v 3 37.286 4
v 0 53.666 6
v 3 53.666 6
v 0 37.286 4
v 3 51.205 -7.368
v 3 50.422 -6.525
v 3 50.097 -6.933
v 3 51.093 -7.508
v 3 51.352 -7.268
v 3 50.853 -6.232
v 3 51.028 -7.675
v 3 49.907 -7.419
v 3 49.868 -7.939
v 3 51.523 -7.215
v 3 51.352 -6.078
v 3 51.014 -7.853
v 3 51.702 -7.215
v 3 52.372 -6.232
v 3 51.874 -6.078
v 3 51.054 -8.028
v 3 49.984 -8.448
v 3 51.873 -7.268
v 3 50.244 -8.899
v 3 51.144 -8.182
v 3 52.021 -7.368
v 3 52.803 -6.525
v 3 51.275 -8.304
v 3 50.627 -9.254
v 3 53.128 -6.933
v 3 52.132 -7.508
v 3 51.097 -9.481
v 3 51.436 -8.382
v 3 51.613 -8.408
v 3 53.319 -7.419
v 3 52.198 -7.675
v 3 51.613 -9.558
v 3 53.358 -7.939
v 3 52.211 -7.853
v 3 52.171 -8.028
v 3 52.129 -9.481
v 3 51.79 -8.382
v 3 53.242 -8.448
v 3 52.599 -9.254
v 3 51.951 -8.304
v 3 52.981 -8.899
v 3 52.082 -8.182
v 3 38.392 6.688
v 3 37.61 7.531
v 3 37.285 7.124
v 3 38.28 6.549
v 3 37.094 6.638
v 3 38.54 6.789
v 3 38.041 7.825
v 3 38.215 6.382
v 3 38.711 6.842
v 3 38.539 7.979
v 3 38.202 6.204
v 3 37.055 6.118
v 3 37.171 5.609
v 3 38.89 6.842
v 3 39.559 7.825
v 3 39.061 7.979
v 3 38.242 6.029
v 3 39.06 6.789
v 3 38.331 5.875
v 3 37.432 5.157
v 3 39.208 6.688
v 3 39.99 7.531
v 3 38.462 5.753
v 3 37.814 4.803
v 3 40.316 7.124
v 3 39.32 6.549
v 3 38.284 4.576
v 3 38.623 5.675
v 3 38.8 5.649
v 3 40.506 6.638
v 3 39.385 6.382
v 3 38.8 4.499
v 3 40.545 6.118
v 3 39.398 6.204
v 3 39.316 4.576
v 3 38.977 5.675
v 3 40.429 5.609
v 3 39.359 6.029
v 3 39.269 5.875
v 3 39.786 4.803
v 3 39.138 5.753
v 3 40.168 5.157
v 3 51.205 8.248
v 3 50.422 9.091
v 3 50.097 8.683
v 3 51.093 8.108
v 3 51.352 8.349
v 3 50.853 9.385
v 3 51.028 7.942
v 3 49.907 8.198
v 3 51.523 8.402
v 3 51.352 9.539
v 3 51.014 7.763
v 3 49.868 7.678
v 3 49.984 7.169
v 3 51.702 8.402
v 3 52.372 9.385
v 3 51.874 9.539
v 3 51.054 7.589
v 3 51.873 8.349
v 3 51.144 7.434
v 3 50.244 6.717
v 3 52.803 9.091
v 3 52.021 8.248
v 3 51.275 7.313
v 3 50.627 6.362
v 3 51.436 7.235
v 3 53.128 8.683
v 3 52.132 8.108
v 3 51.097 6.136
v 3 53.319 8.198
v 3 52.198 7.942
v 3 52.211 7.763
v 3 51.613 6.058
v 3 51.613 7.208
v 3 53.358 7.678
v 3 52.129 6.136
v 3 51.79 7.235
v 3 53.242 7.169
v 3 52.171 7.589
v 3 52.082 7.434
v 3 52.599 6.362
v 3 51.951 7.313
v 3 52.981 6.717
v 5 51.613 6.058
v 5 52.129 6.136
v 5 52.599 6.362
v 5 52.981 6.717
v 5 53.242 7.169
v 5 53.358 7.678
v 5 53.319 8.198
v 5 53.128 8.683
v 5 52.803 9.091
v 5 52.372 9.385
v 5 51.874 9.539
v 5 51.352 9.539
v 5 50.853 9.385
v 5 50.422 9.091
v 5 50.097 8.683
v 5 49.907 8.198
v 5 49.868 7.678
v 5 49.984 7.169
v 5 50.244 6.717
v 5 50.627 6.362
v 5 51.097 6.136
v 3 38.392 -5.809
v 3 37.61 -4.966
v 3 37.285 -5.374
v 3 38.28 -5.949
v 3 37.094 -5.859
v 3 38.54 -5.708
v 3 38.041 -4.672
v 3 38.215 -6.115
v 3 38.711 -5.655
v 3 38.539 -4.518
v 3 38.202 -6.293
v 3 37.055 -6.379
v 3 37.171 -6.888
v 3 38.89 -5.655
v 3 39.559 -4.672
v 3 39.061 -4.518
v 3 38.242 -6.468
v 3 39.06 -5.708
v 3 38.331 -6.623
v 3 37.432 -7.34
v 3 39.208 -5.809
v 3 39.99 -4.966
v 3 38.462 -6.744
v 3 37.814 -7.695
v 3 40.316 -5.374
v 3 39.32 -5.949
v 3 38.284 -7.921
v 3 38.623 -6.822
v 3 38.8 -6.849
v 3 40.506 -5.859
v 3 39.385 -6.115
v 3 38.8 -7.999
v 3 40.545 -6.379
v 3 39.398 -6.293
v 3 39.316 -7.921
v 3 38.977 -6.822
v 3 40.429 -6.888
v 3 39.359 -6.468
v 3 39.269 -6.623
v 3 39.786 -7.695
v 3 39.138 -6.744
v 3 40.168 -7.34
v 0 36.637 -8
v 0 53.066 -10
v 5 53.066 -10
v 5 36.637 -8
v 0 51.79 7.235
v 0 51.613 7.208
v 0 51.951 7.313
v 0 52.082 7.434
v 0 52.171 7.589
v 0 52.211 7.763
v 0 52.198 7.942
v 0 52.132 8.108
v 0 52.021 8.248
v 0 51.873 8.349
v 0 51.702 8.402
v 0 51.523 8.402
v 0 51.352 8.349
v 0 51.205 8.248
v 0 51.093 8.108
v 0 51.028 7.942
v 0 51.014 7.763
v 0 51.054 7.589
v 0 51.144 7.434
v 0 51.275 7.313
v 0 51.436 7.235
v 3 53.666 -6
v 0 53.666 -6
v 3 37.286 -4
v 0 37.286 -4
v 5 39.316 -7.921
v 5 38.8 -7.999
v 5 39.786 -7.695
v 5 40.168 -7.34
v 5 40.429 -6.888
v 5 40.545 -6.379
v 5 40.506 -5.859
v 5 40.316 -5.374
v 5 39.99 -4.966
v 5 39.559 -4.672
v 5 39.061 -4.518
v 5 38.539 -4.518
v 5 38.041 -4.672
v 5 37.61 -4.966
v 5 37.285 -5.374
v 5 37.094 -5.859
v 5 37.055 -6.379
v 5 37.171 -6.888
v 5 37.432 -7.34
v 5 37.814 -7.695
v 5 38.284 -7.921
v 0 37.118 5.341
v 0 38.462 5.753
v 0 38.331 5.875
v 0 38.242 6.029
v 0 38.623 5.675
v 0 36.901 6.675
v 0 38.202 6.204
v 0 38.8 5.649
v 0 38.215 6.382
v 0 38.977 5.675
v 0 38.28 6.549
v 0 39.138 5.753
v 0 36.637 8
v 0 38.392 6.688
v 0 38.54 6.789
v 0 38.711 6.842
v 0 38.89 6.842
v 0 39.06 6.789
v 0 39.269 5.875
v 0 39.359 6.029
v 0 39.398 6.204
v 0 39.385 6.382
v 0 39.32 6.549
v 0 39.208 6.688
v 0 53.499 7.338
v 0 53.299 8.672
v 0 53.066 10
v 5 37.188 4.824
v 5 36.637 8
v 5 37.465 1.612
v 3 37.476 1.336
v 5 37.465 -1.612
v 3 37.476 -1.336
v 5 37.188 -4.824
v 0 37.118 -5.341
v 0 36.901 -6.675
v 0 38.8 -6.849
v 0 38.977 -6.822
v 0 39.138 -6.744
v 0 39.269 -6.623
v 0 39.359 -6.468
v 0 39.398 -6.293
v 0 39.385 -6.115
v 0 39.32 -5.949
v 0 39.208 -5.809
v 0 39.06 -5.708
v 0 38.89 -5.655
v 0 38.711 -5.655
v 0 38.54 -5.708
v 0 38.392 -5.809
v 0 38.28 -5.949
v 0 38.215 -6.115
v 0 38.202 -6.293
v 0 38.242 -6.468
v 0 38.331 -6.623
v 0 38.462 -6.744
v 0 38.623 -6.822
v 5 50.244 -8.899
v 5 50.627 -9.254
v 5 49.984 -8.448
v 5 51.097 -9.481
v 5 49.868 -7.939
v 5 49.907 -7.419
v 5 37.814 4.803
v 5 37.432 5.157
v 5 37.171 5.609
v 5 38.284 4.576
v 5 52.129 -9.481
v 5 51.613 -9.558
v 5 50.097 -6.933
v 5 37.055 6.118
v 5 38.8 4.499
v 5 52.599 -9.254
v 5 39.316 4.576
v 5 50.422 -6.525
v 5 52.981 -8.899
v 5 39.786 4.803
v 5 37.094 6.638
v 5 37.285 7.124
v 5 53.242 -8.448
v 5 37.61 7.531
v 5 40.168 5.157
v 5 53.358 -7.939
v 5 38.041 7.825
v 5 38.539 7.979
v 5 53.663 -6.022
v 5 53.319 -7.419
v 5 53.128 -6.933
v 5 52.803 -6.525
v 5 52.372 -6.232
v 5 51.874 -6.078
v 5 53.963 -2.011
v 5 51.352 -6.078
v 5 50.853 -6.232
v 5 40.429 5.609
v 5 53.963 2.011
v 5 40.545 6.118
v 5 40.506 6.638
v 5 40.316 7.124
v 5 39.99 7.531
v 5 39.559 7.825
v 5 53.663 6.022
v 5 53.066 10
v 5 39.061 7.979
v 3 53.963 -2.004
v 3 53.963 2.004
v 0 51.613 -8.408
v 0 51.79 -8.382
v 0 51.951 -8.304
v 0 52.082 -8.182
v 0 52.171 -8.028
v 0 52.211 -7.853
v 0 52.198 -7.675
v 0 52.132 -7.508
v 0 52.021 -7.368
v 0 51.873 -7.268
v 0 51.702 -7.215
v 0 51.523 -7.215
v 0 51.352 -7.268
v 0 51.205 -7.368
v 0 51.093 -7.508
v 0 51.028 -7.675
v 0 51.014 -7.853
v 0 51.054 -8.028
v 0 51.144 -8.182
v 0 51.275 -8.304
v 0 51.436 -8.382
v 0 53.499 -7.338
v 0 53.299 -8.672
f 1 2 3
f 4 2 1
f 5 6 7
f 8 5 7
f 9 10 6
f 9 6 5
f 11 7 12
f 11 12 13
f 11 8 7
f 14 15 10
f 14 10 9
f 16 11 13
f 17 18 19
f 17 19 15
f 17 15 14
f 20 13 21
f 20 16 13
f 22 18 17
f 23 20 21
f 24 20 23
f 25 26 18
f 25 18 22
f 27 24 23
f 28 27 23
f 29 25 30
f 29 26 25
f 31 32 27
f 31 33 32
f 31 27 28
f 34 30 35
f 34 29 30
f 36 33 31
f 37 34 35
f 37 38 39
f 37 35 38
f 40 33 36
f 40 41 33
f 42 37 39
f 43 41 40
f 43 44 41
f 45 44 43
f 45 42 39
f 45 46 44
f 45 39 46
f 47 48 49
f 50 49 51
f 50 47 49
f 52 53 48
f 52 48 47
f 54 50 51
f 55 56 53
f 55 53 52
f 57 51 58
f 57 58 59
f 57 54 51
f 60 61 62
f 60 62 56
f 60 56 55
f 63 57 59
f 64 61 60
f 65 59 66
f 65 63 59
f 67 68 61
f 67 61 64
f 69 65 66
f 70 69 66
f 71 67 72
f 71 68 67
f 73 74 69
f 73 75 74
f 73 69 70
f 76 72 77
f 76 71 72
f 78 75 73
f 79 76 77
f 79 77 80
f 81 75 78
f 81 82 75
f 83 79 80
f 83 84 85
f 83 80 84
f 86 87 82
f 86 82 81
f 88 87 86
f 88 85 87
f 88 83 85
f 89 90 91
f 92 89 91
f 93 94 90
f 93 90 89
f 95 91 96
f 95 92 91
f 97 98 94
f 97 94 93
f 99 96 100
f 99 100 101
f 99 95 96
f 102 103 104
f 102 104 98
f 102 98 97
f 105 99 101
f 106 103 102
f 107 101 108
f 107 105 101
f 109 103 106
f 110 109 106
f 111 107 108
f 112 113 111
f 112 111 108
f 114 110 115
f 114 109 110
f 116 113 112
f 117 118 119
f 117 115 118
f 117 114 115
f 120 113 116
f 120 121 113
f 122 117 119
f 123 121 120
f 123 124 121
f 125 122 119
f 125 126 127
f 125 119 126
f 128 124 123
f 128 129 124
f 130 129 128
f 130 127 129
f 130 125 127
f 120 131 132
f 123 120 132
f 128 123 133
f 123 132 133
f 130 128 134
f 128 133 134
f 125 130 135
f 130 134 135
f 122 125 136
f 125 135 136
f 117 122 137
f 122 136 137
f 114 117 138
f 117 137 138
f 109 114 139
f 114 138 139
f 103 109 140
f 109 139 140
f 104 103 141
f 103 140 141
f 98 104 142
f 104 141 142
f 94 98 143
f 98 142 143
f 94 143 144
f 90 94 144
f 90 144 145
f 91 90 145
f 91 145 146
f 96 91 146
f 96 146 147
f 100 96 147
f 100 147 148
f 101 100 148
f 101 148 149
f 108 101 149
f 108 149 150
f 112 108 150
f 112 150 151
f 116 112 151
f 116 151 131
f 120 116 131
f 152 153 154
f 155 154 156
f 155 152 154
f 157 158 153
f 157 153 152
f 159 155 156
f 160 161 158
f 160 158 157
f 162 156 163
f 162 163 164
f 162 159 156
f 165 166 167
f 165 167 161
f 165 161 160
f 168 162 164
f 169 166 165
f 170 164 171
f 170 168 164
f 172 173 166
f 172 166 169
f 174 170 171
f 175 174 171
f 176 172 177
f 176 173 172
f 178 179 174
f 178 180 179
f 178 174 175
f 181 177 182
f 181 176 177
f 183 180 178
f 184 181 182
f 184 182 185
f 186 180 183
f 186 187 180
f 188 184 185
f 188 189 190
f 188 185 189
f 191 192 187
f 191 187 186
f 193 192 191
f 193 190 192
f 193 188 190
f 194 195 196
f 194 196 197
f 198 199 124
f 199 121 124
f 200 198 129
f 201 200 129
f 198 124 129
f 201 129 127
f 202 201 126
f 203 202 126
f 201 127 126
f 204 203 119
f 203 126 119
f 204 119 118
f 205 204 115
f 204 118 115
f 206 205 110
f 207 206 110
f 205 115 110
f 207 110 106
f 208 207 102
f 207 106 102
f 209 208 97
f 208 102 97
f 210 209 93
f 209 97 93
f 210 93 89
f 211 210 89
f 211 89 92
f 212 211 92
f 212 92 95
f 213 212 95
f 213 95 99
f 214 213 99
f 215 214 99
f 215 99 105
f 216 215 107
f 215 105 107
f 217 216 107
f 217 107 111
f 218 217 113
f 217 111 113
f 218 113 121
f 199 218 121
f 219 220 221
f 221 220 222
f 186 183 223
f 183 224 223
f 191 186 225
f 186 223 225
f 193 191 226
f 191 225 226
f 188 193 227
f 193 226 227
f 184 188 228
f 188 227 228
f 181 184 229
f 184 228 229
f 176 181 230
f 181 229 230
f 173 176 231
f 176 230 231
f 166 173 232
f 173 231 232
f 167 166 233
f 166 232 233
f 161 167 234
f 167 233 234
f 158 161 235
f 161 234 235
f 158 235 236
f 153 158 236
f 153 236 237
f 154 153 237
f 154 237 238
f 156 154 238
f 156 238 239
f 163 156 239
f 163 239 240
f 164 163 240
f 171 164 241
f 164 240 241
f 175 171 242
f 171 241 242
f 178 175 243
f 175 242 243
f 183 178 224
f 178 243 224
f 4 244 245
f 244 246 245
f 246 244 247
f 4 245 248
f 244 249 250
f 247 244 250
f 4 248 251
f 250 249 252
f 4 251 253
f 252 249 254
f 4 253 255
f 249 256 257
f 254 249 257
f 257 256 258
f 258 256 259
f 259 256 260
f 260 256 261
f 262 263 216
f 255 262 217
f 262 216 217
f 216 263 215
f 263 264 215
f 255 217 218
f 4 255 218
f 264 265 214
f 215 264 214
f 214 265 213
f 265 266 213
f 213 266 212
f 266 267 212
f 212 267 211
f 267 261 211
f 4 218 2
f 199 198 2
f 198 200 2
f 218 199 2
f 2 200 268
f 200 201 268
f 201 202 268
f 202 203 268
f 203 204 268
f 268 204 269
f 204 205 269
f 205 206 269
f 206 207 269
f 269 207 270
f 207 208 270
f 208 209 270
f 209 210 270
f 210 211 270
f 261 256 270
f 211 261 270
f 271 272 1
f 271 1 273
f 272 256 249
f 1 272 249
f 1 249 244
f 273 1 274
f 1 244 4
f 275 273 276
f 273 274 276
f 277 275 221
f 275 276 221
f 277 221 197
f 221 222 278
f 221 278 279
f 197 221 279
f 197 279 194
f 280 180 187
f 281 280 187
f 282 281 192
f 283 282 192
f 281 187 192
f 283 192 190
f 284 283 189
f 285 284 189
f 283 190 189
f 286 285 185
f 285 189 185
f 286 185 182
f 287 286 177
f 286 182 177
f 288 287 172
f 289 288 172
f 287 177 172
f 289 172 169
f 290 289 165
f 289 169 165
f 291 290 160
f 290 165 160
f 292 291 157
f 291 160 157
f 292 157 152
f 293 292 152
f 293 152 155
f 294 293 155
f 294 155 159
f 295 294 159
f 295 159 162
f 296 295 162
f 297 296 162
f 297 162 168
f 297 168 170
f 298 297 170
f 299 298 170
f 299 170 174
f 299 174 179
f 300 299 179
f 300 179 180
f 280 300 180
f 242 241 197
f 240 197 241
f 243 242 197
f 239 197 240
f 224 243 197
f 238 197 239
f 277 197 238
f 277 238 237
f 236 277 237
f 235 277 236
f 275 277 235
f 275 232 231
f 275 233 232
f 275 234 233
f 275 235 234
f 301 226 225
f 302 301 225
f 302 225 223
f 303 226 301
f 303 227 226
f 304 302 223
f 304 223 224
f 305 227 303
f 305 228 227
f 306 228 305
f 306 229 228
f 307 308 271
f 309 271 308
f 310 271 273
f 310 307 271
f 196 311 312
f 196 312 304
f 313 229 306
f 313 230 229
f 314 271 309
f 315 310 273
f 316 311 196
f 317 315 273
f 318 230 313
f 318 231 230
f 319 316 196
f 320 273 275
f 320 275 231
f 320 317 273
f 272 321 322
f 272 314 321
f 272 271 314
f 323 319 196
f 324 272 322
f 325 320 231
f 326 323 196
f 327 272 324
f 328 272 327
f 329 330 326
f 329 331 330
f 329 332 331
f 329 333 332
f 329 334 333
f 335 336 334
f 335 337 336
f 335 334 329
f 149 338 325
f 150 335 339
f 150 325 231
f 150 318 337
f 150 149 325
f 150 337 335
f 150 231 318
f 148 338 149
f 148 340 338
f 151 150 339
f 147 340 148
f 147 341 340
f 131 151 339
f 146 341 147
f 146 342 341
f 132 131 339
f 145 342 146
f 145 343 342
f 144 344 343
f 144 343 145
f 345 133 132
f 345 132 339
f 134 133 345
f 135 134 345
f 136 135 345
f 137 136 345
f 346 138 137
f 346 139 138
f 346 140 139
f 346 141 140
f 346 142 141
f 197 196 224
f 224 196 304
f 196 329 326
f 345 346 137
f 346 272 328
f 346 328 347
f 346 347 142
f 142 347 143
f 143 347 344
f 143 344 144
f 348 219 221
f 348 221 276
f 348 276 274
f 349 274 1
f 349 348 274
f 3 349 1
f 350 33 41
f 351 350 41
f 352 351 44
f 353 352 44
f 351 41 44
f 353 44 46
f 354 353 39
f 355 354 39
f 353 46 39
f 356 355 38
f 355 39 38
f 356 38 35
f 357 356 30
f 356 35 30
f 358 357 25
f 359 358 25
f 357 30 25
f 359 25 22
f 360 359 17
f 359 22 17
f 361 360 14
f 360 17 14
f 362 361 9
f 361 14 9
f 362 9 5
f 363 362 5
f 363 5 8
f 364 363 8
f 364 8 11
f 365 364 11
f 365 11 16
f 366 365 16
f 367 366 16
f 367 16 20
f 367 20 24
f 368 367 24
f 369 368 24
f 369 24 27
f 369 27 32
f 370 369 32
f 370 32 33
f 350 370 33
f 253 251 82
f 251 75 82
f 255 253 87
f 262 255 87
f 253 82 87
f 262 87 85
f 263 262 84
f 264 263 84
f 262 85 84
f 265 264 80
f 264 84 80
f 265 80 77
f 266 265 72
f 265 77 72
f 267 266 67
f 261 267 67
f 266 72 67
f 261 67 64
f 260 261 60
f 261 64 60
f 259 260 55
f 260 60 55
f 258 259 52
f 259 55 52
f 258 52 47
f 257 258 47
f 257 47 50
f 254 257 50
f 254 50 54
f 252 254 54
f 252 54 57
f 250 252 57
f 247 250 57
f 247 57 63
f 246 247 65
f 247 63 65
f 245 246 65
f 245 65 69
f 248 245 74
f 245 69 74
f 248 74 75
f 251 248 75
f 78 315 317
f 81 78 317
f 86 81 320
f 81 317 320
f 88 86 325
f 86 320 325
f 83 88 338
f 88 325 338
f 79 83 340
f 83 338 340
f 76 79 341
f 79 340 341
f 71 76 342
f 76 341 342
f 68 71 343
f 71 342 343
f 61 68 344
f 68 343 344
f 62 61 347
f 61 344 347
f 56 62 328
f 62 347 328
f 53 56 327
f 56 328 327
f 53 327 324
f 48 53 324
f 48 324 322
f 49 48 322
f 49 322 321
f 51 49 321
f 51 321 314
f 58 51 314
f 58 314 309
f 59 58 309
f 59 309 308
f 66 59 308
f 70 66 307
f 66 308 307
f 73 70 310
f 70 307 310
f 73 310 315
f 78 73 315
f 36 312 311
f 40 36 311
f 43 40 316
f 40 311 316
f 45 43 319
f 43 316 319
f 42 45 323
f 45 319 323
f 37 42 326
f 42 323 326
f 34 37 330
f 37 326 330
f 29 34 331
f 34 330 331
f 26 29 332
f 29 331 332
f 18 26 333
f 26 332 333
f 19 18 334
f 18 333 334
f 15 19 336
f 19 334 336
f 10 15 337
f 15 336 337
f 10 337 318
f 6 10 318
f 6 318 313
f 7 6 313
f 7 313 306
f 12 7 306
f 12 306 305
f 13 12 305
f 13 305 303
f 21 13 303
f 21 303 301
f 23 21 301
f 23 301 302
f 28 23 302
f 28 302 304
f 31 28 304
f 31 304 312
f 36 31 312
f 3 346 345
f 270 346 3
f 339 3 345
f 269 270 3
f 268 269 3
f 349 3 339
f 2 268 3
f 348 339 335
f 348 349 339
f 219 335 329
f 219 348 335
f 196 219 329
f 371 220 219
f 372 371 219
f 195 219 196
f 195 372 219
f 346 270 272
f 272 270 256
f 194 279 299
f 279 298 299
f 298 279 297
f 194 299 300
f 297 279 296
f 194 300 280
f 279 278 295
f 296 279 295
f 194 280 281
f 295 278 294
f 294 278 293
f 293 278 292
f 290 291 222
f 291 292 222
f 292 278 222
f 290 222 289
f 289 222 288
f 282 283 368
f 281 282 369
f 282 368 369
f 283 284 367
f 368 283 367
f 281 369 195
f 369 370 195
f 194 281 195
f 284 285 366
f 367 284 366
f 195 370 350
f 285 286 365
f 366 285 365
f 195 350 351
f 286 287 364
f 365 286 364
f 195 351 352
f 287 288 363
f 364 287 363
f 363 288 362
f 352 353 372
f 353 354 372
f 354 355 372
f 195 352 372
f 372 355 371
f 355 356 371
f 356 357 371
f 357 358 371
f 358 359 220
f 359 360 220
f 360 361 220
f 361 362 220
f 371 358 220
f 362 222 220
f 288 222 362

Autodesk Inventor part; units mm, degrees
ref_plane "YZ Plane" through (0, 0, 0) normal (1, 0, 0) x (0, 1, 0)
ref_plane "XZ Plane" through (0, 0, 0) normal (0, 1, 0) x (-1, 0, 0)
ref_plane "XY Plane" through (0, 0, 0) normal (0, 0, 1) x (1, 0, 0)
sketch "Sketch1" plane through (0, 0, 0) normal (1, 0, 0) x (0, 1, 0)
  circle A0 centre (0, 0) radius 54
  circle A1 centre (0, 0) radius 37.5
  line L0 (37.5, 0) -> (54, 0)
  line L1 (53.066, -10) -> (36.6367, -8)
  line L2 (53.066, 10) -> (36.6367, 8)
  arc A2 (53.066, -10) -> (53.066, 10) centre (0, 0) ccw
  arc A3 (36.6367, -8) -> (36.6367, 8) centre (0, 0) ccw
  dimension "d0" = 108
  dimension "d1" = 75
  dimension "d2" = 10
  dimension "d3" = 0
  dimension "d4" = 8
extrude "Extrusion1" add sketch "Sketch1" along normal blind 5 contours L0 A1 L2 A0 | A0 L1 A1 L0
sketch "Sketch2" plane through (0, 0, 0) normal (-1, 0, 0) x (0, 0, 1)
  arc A0 (10, 53.066) -> (-10, 53.066) centre (0, 0) ccw projected
  line L0 (-6, 53.6656) -> (-4, 37.2861)
  arc A1 (8, 36.6367) -> (-8, 36.6367) centre (0, 0) ccw projected
  line L1 (0, 54) -> (0, 37.5)
  line L2 (6, 53.6656) -> (4, 37.2861)
  arc A2 (6, 53.6656) -> (-6, 53.6656) centre (0, 0) ccw
  arc A3 (4, 37.2861) -> (-4, 37.2861) centre (0, 0) ccw
  point P0 (0, 0)
  dimension "d7" = 4
  dimension "d8" = 4
extrude "Extrusion2" cut sketch "Sketch2" against normal blind 3
sketch "Sketch3" plane through (5, 0, 0) normal (1, 0, 0) x (0, 0, -1)
  line L0 (-10, 53.066) -> (-8, 36.6367) projected
  circle A0 centre (0, 0) radius 52.2
  circle A1 centre (0, 0) radius 39.3
  circle A2 centre (-7.8083, 51.6127) radius 0.6
  circle A3 centre (-6.2486, 38.8001) radius 0.6
  line L1 (0, 54) -> (0, 37.3718)
  circle A4 centre (7.8083, 51.6127) radius 0.6
  circle A5 centre (6.2486, 38.8001) radius 0.6
  dimension "d15" = 104.4
  dimension "d16" = 78.6
  dimension "d17" = 1.2
  dimension "d18" = 1.2
  dimension "d19" = 2
  dimension "d20" = 2
extrude "Extrusion3" cut sketch "Sketch3" against normal through all contours A2 A0 | A0 A2 | A3 A1 | A1 A3 | A4 A0 | A0 A4 | A5 A1 | A1 A5
sketch "Sketch4" plane through (5, 0, 0) normal (1, 0, 0) x (0, 0, -1)
  circle A0 centre (-7.8083, 51.6127) radius 0.6 projected
  circle A1 centre (-7.8083, 51.6127) radius 1.75
  circle A2 centre (7.8083, 51.6127) radius 0.6 projected
  circle A3 centre (7.8083, 51.6127) radius 1.75
  circle A4 centre (6.2486, 38.8001) radius 0.6 projected
  circle A5 centre (6.2486, 38.8001) radius 1.75
  circle A6 centre (-6.2486, 38.8001) radius 0.6 projected
  circle A7 centre (-6.2486, 38.8001) radius 1.75
  point P0 (0, 0)
  dimension "d23" = 3.5
  dimension "d24" = 3.5
  dimension "d25" = 3.5
  dimension "d26" = 3.5
extrude "Extrusion4" cut sketch "Sketch4" against normal blind 2
properties part number "32111_Lock Wedge Backing_V1" material "Acetal Resin, White"
